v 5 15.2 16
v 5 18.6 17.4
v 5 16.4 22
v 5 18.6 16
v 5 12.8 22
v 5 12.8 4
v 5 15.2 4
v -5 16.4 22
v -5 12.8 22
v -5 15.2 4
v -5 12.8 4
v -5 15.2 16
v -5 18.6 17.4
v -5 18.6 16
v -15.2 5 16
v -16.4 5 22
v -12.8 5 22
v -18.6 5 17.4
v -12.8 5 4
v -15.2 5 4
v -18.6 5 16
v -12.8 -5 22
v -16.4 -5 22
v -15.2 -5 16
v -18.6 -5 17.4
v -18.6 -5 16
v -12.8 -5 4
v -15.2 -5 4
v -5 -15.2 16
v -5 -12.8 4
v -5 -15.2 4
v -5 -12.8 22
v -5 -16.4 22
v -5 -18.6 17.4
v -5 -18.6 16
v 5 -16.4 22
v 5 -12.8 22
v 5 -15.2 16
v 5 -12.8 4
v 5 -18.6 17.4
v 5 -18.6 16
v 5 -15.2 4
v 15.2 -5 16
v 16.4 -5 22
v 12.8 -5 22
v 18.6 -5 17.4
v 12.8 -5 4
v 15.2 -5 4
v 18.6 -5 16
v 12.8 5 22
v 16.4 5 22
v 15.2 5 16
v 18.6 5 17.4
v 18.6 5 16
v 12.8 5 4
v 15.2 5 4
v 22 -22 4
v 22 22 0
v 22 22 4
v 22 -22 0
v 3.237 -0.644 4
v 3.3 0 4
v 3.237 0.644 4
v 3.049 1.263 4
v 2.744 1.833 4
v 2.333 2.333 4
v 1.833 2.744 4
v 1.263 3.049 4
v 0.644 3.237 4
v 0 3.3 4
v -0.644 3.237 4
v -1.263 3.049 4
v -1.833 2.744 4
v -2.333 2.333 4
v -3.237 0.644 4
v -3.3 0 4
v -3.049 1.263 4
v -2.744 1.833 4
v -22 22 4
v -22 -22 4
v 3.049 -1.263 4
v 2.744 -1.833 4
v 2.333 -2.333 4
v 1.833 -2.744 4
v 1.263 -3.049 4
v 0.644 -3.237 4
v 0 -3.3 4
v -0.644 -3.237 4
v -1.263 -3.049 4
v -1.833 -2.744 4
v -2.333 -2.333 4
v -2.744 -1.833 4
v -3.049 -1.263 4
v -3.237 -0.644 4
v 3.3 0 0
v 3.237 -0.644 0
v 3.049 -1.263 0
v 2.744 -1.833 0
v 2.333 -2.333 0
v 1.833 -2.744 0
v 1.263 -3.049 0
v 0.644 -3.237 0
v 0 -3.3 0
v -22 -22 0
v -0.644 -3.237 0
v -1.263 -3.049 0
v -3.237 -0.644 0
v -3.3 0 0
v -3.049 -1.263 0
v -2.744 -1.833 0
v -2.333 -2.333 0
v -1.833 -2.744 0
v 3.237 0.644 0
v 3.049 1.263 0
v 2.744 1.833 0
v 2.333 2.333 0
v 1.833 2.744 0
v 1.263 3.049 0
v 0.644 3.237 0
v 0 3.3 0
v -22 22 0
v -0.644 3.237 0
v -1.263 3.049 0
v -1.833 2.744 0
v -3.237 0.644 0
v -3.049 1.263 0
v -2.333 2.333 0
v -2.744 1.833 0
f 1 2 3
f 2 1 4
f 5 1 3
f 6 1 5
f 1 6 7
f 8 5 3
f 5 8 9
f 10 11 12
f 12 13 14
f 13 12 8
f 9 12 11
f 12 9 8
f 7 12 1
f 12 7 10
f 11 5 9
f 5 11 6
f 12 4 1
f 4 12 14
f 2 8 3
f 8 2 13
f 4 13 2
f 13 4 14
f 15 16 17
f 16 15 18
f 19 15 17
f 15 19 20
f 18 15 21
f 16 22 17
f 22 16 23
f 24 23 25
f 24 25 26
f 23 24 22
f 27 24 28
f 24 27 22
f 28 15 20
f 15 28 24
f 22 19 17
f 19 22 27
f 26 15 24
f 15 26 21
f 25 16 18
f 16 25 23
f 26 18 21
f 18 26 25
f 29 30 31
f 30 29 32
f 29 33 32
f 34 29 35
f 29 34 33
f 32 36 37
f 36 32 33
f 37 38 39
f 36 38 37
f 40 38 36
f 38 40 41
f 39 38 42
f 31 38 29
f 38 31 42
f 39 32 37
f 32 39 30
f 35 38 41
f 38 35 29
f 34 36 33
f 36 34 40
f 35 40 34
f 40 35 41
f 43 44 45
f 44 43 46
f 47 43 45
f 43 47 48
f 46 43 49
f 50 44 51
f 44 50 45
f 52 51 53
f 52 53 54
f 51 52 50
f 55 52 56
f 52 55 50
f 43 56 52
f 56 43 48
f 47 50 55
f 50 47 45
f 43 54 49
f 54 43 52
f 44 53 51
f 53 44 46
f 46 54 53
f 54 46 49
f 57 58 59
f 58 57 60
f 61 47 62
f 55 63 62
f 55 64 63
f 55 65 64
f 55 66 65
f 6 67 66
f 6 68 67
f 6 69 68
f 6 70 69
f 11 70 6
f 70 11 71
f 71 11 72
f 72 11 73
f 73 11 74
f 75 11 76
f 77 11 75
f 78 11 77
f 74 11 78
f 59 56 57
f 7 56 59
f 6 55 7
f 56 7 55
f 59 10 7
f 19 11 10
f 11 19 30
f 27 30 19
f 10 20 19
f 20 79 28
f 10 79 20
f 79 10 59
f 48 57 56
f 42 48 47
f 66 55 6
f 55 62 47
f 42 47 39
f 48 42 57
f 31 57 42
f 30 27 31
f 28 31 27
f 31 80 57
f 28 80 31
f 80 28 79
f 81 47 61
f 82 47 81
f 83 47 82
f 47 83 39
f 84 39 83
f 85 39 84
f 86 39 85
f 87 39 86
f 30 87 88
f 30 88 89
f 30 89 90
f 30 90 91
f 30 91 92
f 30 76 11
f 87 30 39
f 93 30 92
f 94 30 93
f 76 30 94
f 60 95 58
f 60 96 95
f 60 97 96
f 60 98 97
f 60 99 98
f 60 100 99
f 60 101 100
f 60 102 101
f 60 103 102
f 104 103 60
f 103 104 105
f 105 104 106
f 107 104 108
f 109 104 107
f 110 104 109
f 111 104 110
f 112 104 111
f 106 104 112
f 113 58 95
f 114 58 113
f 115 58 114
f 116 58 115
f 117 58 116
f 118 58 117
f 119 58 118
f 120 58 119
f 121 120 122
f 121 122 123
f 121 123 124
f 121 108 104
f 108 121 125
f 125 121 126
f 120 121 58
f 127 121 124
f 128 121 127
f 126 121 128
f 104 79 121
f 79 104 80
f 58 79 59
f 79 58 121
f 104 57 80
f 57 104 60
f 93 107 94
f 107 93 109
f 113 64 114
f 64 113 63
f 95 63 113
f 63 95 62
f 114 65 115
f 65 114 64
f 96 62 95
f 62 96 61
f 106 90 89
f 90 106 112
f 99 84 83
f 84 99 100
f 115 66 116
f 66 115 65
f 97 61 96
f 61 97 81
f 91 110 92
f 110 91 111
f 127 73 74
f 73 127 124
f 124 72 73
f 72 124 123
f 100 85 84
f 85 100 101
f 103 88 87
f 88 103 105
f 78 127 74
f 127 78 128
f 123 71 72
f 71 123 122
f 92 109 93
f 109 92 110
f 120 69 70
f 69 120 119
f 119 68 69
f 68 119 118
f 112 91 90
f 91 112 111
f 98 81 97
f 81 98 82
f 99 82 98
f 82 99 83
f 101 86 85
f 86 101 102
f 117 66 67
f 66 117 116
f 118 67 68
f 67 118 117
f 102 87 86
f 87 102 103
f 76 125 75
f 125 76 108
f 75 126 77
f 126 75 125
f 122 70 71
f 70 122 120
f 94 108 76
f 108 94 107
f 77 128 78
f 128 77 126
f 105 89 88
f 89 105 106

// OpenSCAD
$fn = 32;

// ----------------------------------------------------------------------
// Snap-fit latch: 4 arms, 18 mm tall, 3.6 mm undercut hooks
// ----------------------------------------------------------------------

// --- parameters (mm) ---
base_d = 44;              // base plate depth
base_h = 4;               // base plate thickness
span = 28;                // distance between opposite arms
arm_t = 2.4;              // arm thickness
arm_d = 10;               // arm width
height = 18;              // free arm length
head_len = 3.6;           // hook reach
head_h = 6;               // hook height
lead = 1.4;               // lead-in ramp thickness
bore_d = 6.6;             // base fixing bore
top_z = 22;               // height of the arm tips above the base

arms = 4;

difference() {
  union() {
    /* base plate, centred on the arm ring */
    translate([-22, -22, 0]) cube([base_d, base_d, base_h]);
    for (a = [0 : 360 / arms : 359]) rotate([0, 0, a]) {
    /* arm, sunk 0.5 mm into the base */
    translate([-arm_d / 2, span / 2 - arm_t / 2, base_h - 0.5]) cube([arm_d, arm_t, height + 0.5]);
    /* hook: a convex hull of a tall inner block and a thin outer lip
       gives a flat undercut below and a lead-in ramp on top */
    hull() {
      translate([-arm_d / 2, span / 2 + arm_t / 2 - 0.6, top_z - head_h]) cube([arm_d, lead + 0.4, head_h]);
      translate([-arm_d / 2, span / 2 + arm_t / 2 - 0.2, top_z - head_h]) cube([arm_d, head_len, lead]);
    }
    }
  }
  translate([0, 0, -2.5]) cylinder(h = base_h + 5, d = bore_d);
}
